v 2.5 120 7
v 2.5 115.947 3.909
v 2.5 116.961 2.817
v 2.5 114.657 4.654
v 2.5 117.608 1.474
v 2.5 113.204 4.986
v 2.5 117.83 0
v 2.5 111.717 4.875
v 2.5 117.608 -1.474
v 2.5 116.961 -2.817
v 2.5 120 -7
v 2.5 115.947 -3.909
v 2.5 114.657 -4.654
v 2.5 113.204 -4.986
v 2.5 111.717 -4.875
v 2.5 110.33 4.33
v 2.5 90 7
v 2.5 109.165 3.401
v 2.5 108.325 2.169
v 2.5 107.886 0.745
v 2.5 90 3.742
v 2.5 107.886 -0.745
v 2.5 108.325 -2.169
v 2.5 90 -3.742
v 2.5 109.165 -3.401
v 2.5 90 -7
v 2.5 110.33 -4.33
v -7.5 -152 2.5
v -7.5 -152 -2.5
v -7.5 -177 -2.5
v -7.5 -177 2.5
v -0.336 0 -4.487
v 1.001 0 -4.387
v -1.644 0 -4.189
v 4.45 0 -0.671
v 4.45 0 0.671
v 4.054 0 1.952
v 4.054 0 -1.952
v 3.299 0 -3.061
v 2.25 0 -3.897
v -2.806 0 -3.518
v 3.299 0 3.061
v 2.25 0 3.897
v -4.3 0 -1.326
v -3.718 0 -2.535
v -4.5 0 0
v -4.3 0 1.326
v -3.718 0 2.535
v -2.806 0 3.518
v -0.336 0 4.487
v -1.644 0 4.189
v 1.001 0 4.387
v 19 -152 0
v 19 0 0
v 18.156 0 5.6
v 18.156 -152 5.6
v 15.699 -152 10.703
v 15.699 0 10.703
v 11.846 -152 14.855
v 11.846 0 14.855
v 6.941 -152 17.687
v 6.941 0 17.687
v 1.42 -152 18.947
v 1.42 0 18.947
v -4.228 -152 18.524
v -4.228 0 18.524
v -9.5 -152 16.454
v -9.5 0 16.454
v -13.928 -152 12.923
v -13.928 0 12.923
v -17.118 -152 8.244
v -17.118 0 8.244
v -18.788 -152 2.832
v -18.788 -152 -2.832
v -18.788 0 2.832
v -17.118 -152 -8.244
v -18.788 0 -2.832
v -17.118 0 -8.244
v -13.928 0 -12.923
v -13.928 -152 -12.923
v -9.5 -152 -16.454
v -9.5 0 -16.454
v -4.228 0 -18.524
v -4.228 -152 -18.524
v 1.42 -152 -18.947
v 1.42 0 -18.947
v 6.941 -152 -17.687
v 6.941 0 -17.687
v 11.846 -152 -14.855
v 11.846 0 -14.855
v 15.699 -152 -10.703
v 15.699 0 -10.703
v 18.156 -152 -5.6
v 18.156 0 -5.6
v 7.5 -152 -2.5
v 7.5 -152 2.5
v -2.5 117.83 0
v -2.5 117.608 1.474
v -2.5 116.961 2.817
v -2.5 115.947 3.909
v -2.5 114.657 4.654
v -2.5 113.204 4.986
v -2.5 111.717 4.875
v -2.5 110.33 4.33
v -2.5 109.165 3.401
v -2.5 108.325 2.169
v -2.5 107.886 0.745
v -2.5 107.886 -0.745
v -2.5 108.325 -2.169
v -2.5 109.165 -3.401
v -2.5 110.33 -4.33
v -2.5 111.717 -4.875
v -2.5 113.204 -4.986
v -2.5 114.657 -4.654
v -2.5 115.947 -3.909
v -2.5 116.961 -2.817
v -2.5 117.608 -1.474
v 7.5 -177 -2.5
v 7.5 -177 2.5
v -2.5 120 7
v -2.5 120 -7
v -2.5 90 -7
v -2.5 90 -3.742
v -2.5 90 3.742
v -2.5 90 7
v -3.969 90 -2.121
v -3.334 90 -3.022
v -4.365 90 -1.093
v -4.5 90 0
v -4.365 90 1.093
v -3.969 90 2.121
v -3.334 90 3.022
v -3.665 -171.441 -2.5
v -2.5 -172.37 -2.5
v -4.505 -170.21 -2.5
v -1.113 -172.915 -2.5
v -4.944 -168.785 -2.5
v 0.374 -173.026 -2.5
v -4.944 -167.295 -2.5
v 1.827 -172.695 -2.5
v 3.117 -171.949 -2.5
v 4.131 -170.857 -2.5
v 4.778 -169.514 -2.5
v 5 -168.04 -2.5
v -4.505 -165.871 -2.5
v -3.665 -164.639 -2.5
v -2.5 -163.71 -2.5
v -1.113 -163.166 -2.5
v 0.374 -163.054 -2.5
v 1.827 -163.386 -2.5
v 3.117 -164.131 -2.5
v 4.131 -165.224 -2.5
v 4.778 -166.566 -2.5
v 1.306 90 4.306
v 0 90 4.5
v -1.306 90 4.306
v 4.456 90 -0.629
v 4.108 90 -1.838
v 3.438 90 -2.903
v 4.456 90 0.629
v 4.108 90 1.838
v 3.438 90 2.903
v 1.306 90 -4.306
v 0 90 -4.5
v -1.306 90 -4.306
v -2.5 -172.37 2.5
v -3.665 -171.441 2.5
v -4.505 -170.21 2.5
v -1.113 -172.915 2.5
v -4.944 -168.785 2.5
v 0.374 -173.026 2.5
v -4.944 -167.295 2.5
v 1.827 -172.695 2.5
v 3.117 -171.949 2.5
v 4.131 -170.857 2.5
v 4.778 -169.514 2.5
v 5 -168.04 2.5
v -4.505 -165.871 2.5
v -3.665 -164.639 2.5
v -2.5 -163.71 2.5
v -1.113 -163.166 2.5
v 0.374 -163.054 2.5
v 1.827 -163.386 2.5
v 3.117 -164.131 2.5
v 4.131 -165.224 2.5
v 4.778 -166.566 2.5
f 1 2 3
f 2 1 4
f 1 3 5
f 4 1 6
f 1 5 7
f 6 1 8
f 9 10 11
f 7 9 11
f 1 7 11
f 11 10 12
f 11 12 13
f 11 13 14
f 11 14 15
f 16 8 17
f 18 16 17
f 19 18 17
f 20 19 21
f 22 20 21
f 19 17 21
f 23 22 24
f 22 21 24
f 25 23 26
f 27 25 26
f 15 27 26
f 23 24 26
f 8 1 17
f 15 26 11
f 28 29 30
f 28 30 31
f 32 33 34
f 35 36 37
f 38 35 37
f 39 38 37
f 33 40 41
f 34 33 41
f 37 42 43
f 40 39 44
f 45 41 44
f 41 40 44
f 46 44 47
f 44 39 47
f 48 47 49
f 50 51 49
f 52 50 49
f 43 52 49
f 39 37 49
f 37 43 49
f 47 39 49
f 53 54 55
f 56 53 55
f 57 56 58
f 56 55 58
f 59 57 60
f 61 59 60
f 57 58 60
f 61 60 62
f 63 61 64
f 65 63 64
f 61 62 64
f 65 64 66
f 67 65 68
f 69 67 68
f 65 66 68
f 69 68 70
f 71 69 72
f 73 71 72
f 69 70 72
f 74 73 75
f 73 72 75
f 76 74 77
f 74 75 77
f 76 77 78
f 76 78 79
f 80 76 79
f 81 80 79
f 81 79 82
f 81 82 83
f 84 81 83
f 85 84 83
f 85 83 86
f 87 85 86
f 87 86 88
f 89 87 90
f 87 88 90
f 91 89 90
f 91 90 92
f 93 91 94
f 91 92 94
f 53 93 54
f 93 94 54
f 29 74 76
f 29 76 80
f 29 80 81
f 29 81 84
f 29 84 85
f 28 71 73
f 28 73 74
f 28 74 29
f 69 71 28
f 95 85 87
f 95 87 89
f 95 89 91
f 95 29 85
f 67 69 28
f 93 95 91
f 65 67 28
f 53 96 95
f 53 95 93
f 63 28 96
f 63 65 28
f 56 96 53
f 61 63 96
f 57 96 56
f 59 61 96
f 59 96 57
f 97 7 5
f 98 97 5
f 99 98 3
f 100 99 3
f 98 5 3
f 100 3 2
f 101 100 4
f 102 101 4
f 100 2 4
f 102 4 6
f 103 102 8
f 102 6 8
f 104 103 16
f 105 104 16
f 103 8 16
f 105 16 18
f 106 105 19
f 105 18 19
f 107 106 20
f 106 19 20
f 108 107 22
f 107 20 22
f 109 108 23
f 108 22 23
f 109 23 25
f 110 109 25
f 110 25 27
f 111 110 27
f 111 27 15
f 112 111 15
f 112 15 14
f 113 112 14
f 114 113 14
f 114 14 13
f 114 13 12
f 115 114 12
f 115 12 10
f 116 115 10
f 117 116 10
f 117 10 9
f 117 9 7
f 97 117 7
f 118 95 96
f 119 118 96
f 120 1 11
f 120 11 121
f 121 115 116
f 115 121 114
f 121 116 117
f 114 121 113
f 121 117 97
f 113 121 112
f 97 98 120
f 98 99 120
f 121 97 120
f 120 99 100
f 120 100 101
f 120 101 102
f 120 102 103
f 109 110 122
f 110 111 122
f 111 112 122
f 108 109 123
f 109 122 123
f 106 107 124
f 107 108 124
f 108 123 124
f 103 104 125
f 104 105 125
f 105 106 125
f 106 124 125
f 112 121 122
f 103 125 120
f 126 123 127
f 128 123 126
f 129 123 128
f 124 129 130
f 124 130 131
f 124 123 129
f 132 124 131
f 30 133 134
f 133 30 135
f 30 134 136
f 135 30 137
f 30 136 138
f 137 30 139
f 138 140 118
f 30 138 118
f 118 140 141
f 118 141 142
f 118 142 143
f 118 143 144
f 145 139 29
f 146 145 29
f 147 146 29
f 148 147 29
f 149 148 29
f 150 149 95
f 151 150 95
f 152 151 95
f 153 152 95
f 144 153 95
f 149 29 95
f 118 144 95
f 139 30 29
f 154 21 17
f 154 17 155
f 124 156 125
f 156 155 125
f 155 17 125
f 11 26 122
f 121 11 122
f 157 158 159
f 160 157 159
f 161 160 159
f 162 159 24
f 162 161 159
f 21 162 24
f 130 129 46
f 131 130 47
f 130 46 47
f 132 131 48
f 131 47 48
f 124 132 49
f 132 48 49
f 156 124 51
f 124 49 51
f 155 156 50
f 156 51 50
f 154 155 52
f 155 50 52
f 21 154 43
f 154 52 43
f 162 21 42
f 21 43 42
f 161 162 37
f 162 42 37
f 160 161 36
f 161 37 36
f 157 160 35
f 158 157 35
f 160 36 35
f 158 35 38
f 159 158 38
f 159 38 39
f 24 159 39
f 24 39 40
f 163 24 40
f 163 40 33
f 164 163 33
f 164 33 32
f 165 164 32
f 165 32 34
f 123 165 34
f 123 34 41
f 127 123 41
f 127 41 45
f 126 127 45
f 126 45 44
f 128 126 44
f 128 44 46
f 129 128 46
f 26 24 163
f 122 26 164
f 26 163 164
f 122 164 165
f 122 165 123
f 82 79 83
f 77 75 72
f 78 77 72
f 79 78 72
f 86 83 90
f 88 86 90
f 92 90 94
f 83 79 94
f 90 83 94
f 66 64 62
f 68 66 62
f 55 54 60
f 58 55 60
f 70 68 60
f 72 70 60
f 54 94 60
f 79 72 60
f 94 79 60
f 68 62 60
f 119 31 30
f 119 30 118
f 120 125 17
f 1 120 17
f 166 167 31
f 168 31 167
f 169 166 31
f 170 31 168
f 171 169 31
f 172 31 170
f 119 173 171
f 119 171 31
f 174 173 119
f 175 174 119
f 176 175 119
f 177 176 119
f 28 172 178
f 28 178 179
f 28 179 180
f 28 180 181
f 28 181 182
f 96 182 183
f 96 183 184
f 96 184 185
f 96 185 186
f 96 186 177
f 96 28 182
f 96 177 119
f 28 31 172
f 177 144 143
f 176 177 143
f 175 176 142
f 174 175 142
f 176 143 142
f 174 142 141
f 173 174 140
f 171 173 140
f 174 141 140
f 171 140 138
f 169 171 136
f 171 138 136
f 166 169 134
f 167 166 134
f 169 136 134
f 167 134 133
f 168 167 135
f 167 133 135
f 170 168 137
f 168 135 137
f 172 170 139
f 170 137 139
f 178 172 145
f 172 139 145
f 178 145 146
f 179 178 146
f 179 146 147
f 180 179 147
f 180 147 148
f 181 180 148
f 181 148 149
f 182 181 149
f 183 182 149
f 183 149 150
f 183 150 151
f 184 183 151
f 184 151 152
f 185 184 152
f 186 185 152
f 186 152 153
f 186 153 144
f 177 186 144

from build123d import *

# Parameters (mm, degrees)
F0_R      = 19
F1_DEPTH  = 152
F2_R      = 4.5
F3_DEPTH  = 90
F5_DEPTH  = 30
F6_R      = 5
F7_DEPTH  = 25
F8_W      = 15
F8_H      = 5
F9_DEPTH  = 25
F10_R     = 5
F11_DEPTH = 25


with BuildPart() as f1:
    # F0 (on Front) → F1 (new body)
    with BuildSketch(Plane.XZ):
        Circle(F0_R)
    extrude(amount=F1_DEPTH)

    # F8 (on face) → F9 (join)
    with BuildSketch(Plane.XZ.offset(152)):
        Rectangle(F8_W, F8_H)
    extrude(amount=F9_DEPTH)

    # F10 (on face) → F11 (cut)
    with BuildSketch(Plane(origin=(0, 0, -2.5), x_dir=(1, 0, 0), z_dir=(0, 0, -1))):
        with Locations((0, 168.0401433565)):
            Circle(F10_R)
    extrude(amount=-F11_DEPTH, mode=Mode.SUBTRACT)


with BuildPart() as f3:
    # F2 (on face) → F3 (new body)
    with BuildSketch(Plane(origin=(0, 0, 0), x_dir=(-1, 0, 0), z_dir=(0, 1, 0))):
        Circle(F2_R)
    extrude(amount=F3_DEPTH)

    # F4 (on face) → F5 (join)
    with BuildSketch(Plane(origin=(0, 90, 0), x_dir=(-1, 0, 0), z_dir=(0, 1, 0))):
        with BuildLine():
            Line((2.5, -7), (2.5, -3.7416573868))
            ThreePointArc((2.5, -3.7416573868), (0, -4.5), (-2.5, -3.7416573868))
            Line((-2.5, -3.7416573868), (-2.5, -7))
            Line((-2.5, -7), (2.5, -7))
        make_face()
        with BuildLine():
            Line((2.5, -3.7416573868), (2.5, 3.7416573868))
            ThreePointArc((2.5, 3.7416573868), (0, 4.5), (-2.5, 3.7416573868))
            Line((-2.5, 3.7416573868), (-2.5, -3.7416573868))
            ThreePointArc((-2.5, -3.7416573868), (0, -4.5), (2.5, -3.7416573868))
        make_face()
        with BuildLine():
            Line((2.5, 3.7416573868), (2.5, 7))
            Line((2.5, 7), (-2.5, 7))
            Line((-2.5, 7), (-2.5, 3.7416573868))
            ThreePointArc((-2.5, 3.7416573868), (0, 4.5), (2.5, 3.7416573868))
        make_face()
    extrude(amount=F5_DEPTH)

    # F6 (on face) → F7 (cut)
    with BuildSketch(Plane.YZ.offset(2.5)):
        with Locations((112.8298740598, 0)):
            Circle(F6_R)
    extrude(amount=-F7_DEPTH, mode=Mode.SUBTRACT)


solid = Compound([f1.part, f3.part])
